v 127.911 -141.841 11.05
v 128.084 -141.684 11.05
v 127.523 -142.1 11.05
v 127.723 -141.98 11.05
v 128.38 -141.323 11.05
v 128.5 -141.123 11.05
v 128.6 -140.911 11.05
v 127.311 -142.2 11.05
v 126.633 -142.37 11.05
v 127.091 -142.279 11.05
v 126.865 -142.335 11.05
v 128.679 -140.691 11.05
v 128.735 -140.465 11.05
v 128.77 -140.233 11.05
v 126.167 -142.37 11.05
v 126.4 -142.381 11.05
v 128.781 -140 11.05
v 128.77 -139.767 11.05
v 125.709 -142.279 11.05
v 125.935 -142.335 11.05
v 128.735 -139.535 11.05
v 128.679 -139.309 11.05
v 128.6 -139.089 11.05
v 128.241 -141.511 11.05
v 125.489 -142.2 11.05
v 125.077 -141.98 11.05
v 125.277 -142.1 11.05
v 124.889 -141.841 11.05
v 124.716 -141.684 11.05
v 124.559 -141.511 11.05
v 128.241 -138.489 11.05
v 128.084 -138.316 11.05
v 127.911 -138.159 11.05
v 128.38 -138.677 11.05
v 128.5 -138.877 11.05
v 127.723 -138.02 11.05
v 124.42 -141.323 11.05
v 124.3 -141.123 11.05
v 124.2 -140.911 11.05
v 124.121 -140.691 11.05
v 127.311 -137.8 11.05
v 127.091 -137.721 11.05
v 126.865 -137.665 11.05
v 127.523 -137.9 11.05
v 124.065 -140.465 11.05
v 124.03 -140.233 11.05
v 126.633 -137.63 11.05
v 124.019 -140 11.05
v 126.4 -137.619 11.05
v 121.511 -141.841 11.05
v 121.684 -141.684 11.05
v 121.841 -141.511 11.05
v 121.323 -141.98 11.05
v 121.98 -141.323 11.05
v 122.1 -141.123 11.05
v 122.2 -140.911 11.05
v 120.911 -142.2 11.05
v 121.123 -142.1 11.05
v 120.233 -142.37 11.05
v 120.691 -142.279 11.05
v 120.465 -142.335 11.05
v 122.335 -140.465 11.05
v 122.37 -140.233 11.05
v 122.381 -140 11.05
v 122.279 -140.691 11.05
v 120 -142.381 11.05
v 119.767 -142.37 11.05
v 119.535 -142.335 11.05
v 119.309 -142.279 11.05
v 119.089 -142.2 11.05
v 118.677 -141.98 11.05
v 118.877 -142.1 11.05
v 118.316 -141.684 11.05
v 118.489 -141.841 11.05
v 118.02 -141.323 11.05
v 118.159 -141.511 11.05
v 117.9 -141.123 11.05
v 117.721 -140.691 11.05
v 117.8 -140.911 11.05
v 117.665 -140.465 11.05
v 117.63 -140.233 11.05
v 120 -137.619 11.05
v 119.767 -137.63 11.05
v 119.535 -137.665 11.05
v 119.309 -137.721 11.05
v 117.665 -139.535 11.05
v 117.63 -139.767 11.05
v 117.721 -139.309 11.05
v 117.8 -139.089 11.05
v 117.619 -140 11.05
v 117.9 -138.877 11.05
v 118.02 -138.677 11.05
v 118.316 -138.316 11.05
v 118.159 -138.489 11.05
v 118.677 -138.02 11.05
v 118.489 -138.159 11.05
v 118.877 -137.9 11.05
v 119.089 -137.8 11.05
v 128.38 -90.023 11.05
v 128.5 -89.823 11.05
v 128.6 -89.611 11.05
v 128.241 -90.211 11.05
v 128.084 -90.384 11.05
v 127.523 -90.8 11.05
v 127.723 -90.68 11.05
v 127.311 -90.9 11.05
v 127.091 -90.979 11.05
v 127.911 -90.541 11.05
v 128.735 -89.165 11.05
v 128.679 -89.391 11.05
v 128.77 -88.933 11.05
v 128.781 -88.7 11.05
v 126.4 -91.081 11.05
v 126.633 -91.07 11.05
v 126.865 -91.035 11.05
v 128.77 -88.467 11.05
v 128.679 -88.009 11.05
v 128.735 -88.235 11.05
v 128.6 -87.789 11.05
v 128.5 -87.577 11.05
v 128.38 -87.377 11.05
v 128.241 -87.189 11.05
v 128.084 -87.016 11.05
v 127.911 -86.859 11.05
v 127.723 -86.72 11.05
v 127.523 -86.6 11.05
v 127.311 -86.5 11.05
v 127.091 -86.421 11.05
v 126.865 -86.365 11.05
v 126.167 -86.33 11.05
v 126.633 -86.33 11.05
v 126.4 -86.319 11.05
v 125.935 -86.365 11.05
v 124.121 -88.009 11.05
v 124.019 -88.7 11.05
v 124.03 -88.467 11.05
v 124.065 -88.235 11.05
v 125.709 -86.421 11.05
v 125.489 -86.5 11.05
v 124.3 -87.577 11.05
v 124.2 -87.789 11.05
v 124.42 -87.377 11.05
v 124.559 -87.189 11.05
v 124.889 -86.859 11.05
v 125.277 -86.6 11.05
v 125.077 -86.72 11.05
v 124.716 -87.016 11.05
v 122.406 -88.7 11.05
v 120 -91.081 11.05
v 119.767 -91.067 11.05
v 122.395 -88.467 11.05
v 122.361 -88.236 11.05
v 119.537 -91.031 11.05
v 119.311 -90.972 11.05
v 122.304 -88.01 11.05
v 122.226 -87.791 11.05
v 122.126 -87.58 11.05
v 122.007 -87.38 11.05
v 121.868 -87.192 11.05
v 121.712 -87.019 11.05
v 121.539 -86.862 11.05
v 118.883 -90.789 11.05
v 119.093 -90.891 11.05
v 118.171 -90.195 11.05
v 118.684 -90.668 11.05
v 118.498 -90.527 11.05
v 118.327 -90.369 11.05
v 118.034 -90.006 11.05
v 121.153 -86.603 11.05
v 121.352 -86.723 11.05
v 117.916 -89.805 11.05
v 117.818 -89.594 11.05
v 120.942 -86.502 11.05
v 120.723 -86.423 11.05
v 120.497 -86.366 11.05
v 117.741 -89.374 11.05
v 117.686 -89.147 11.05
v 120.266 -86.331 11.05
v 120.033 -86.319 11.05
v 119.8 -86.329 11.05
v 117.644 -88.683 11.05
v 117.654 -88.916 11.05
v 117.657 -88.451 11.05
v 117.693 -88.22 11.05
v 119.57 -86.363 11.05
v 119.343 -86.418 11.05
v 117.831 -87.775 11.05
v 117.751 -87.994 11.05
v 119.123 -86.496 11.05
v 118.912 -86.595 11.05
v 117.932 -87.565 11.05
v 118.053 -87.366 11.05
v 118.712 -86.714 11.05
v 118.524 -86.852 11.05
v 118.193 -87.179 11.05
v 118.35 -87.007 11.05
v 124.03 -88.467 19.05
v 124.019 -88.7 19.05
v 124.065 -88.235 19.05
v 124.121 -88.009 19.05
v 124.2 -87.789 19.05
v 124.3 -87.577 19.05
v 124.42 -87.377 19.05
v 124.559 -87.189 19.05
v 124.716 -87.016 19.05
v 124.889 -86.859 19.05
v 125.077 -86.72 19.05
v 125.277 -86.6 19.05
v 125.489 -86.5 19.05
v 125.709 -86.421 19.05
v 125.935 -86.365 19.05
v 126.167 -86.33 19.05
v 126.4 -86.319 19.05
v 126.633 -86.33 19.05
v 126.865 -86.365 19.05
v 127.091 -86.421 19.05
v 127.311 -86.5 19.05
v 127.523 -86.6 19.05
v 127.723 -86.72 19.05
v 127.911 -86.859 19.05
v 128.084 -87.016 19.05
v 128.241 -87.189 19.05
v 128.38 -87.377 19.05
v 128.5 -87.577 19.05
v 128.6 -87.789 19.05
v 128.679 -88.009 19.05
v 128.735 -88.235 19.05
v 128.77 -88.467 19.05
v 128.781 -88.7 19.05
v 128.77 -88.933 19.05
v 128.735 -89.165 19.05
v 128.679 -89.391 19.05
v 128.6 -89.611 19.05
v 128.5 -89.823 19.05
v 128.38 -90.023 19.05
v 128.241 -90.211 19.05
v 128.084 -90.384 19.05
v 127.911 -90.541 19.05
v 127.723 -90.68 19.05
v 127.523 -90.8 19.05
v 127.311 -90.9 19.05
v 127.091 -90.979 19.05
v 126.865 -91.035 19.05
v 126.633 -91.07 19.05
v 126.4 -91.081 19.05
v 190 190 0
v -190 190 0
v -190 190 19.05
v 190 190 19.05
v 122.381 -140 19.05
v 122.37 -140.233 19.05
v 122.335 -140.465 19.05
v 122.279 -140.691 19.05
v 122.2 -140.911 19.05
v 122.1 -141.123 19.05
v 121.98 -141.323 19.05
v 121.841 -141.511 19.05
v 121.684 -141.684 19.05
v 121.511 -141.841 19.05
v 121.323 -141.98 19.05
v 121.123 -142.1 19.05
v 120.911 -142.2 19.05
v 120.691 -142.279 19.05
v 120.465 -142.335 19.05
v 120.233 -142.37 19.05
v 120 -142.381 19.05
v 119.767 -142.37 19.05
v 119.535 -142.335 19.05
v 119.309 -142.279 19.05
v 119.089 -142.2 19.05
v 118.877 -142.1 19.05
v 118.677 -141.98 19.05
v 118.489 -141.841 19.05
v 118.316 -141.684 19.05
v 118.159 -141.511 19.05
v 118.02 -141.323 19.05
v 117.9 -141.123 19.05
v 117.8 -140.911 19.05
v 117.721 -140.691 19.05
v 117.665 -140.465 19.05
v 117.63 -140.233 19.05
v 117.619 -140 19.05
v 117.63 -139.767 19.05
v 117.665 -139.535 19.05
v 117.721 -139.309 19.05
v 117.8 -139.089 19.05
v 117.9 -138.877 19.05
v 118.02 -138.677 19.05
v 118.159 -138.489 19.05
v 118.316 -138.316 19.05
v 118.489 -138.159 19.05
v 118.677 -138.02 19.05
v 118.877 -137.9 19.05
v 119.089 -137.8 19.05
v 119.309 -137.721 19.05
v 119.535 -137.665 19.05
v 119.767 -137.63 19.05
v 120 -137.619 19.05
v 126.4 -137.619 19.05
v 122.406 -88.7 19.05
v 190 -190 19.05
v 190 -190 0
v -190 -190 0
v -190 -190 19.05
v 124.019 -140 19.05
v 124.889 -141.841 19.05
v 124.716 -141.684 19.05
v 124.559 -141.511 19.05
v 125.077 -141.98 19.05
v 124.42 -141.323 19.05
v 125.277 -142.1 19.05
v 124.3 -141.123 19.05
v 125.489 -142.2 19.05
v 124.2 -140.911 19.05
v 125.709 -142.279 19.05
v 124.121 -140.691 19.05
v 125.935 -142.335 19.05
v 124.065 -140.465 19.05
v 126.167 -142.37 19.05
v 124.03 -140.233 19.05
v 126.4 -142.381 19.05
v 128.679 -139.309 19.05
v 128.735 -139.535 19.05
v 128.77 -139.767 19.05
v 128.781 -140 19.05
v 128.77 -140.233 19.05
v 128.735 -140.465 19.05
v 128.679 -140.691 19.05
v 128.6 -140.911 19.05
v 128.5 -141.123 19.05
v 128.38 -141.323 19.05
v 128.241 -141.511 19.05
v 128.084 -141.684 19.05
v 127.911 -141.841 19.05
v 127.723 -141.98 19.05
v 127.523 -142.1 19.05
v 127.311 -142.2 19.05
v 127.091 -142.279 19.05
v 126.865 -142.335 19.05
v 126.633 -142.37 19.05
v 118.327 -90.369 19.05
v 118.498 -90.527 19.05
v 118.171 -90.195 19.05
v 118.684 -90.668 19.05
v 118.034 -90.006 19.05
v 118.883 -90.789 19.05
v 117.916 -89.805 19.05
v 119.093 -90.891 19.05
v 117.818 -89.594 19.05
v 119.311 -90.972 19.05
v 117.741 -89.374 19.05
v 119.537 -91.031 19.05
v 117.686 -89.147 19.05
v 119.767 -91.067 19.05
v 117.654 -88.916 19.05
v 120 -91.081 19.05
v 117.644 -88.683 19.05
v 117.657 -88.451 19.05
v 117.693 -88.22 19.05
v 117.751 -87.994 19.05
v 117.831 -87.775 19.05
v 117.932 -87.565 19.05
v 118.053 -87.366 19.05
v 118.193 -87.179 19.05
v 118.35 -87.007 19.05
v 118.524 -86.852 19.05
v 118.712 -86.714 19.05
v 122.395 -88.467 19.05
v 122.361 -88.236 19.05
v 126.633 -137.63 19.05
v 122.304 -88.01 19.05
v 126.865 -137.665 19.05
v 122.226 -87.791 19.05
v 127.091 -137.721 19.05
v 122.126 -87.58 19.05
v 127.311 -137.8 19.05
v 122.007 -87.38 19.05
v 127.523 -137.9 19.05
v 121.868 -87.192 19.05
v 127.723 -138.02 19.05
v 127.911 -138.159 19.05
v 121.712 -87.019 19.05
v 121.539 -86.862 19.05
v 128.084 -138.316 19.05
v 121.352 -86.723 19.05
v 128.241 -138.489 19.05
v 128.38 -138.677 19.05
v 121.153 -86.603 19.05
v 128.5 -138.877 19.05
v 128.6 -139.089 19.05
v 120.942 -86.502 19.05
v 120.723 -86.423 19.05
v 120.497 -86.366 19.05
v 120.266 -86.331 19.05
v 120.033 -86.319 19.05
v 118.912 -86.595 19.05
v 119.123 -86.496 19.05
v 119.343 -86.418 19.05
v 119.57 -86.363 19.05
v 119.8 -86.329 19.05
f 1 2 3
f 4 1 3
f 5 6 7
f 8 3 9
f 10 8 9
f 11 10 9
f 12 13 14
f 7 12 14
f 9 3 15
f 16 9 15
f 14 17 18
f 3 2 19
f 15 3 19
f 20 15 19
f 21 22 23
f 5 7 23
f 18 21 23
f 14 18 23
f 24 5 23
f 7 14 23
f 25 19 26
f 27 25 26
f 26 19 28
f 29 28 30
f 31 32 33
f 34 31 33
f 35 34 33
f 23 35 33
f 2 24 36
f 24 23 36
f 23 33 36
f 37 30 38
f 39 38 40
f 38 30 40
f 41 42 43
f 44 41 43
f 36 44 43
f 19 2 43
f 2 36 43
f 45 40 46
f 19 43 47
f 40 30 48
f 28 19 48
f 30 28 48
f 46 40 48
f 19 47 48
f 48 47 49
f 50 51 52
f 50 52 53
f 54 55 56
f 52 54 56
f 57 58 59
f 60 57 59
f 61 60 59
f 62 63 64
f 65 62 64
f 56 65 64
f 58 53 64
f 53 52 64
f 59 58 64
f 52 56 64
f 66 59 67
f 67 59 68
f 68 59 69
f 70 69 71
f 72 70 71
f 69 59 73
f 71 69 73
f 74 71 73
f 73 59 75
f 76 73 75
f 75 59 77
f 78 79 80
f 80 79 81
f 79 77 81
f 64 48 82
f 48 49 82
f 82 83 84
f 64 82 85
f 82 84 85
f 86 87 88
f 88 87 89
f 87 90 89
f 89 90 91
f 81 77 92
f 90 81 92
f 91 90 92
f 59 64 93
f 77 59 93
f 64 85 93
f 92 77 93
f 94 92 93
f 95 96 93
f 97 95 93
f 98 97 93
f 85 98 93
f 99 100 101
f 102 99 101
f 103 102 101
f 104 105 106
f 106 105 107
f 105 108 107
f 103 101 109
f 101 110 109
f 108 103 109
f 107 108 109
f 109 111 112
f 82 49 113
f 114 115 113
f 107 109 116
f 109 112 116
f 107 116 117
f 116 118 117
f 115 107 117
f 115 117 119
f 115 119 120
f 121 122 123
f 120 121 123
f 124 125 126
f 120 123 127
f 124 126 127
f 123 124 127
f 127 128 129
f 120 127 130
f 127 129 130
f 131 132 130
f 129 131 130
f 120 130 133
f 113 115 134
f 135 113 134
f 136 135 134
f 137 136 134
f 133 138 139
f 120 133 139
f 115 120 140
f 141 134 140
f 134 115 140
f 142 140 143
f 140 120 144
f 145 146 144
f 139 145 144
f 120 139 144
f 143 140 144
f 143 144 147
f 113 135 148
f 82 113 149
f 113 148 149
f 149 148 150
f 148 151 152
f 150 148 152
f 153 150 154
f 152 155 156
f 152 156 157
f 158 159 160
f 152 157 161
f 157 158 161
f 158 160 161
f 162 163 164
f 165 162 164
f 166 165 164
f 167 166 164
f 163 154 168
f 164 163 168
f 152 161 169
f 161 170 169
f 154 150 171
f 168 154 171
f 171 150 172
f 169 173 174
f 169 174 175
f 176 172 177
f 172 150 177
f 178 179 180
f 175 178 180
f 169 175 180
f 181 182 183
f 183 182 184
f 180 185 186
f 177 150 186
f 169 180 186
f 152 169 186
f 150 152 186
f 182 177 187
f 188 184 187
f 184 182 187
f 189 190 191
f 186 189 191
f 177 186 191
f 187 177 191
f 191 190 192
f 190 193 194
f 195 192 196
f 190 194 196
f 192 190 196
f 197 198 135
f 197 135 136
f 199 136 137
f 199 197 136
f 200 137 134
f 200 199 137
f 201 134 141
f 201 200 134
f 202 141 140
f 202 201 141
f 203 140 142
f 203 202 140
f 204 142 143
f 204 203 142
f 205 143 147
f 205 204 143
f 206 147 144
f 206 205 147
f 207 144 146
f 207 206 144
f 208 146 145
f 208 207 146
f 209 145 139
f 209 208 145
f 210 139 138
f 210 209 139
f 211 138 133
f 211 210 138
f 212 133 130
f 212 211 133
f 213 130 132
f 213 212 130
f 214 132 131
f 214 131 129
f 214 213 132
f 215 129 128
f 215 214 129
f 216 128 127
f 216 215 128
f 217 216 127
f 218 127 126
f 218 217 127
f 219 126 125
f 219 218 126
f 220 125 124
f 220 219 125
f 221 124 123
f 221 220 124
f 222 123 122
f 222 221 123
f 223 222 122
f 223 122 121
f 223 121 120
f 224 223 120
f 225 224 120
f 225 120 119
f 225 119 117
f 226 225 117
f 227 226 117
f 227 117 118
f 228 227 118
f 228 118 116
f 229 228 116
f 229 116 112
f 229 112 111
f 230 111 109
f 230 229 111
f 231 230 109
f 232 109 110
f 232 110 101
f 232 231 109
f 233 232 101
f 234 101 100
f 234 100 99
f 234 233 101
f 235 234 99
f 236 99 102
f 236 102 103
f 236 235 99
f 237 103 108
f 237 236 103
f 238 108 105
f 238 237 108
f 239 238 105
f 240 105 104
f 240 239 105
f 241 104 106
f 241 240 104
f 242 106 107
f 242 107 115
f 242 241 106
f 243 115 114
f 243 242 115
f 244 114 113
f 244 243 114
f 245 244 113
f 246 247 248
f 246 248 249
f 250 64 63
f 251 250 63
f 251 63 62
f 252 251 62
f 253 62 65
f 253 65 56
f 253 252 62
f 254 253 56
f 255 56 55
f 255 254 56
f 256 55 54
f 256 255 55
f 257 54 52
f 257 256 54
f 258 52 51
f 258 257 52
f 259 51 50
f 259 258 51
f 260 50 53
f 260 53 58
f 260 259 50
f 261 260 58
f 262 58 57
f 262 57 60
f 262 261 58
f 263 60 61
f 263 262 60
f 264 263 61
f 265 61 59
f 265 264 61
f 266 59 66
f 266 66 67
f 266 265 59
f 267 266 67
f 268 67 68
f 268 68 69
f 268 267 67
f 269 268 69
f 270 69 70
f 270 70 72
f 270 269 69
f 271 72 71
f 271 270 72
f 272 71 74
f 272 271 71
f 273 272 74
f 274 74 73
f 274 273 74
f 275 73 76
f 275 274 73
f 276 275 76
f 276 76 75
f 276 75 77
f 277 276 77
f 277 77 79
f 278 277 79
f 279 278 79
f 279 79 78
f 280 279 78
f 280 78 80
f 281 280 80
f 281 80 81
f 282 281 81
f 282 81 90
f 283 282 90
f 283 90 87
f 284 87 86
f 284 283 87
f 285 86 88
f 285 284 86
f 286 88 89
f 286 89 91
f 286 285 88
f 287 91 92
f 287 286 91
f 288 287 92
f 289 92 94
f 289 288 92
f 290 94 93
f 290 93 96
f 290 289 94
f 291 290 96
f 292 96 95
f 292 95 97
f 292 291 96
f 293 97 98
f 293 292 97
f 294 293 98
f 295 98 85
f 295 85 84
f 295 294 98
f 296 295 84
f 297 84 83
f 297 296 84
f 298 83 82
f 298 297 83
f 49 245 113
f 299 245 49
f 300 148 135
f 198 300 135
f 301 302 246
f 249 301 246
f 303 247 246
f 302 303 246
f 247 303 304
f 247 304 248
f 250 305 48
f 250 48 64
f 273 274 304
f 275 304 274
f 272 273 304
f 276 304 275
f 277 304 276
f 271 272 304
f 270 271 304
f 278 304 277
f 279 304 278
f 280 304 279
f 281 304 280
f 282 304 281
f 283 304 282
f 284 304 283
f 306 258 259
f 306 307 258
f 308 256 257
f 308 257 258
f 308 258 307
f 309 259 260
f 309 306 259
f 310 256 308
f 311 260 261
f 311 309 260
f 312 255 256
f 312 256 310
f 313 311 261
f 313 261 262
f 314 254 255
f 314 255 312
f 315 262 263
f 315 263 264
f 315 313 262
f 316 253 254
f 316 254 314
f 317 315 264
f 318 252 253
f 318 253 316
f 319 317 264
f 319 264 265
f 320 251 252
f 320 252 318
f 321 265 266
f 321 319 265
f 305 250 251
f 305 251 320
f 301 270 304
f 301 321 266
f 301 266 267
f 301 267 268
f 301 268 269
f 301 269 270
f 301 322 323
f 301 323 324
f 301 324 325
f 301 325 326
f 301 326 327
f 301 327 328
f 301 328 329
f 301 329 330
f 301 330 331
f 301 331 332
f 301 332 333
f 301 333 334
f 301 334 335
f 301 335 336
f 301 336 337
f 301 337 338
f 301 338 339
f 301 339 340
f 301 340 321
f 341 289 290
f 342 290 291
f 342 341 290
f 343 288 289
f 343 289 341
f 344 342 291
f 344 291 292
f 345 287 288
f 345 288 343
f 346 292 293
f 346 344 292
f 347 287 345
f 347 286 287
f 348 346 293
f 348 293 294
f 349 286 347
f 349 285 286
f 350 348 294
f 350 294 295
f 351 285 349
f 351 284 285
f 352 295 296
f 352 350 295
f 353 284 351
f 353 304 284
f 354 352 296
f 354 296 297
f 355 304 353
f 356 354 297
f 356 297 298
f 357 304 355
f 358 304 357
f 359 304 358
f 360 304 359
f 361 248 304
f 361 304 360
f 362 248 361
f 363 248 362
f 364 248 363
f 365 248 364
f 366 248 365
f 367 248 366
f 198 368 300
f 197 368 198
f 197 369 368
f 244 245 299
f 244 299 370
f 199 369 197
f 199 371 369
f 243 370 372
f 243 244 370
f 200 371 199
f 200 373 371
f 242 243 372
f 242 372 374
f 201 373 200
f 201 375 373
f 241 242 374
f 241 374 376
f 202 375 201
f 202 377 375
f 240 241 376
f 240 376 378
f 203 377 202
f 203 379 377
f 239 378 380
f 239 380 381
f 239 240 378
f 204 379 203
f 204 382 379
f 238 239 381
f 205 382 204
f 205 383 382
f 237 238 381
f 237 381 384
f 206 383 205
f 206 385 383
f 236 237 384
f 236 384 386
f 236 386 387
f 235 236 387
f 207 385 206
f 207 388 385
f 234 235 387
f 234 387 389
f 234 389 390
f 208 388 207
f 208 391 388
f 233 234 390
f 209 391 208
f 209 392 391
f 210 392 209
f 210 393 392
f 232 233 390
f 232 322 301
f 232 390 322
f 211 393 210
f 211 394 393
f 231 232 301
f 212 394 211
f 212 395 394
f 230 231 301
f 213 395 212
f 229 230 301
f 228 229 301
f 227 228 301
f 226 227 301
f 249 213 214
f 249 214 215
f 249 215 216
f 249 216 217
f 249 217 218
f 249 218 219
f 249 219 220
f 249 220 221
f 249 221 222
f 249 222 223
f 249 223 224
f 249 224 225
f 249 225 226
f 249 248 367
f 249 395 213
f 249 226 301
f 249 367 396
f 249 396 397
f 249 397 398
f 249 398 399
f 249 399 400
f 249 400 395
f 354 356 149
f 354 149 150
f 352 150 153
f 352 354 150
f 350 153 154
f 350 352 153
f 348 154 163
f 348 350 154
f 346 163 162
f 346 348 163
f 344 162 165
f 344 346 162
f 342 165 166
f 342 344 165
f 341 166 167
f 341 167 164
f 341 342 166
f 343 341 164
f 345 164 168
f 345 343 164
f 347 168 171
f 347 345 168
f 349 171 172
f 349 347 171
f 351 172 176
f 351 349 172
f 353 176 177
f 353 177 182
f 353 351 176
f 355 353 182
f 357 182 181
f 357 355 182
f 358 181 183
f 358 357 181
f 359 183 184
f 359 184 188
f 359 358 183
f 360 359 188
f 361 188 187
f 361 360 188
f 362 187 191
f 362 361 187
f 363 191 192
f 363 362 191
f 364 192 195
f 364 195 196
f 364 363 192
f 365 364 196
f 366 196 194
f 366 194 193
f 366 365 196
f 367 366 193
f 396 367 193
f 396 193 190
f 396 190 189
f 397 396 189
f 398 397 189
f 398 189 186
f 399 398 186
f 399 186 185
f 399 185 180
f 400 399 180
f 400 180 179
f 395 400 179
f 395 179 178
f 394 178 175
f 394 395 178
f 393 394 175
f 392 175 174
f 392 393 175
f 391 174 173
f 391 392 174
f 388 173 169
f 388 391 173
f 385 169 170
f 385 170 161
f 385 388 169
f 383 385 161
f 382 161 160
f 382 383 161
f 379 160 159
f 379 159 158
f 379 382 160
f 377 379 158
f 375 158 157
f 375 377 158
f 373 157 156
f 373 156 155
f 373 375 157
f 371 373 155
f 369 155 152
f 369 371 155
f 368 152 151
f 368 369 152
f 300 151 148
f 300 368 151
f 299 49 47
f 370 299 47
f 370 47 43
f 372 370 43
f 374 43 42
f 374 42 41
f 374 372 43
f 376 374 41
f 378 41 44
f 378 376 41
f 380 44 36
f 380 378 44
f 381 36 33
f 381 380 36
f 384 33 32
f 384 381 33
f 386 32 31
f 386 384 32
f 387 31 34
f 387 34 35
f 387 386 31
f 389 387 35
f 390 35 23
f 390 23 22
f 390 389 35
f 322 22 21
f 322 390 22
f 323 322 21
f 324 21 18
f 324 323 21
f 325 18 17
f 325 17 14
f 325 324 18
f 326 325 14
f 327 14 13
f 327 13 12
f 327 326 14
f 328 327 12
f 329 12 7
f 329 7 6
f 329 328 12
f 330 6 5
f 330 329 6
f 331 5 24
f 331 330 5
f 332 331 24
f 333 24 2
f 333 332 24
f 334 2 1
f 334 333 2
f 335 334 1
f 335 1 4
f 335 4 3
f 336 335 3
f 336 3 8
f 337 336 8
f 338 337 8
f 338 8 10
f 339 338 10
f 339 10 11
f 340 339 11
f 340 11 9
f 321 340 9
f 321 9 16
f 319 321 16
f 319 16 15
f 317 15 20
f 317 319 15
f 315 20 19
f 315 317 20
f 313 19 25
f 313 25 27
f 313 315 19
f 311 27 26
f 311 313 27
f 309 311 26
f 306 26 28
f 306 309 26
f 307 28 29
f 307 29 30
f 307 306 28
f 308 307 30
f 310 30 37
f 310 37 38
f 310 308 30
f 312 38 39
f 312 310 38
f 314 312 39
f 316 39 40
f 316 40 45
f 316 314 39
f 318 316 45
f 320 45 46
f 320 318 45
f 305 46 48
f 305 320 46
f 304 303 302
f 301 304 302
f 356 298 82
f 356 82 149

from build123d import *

# Parameters (mm, degrees)
SKETCH1_W        = 380
SKETCH1_H        = 380
SPOILBOARD_DEPTH = 19.05
SLOT_DEPTH       = 8


with BuildPart() as part:
    # Sketch1 → Spoilboard (new body)
    with BuildSketch(Plane.XY):
        Rectangle(SKETCH1_W, SKETCH1_H)
    extrude(amount=SPOILBOARD_DEPTH)

    # Sketch2 → Slot (cut)
    with BuildSketch(Plane.XY.offset(19.05)):
        with BuildLine():
            Line((120, -137.61875), (120, -91.081118763))
            ThreePointArc((120, -91.081118763), (118.350064134, -87.007386221), (122.40625, -88.7))
            Line((122.40625, -88.7), (124.01875, -88.7))
            ThreePointArc((124.01875, -88.7), (128.083798023, -87.016201977), (126.4, -91.08125))
            Line((126.4, -91.08125), (126.4, -137.61875))
            ThreePointArc((126.4, -137.61875), (128.083798023, -141.683798023), (124.01875, -140))
            Line((124.01875, -140), (122.38125, -140))
            ThreePointArc((122.38125, -140), (118.316201977, -141.683798023), (120, -137.61875))
        make_face()
    extrude(amount=-SLOT_DEPTH, mode=Mode.SUBTRACT)


solid = part.part
